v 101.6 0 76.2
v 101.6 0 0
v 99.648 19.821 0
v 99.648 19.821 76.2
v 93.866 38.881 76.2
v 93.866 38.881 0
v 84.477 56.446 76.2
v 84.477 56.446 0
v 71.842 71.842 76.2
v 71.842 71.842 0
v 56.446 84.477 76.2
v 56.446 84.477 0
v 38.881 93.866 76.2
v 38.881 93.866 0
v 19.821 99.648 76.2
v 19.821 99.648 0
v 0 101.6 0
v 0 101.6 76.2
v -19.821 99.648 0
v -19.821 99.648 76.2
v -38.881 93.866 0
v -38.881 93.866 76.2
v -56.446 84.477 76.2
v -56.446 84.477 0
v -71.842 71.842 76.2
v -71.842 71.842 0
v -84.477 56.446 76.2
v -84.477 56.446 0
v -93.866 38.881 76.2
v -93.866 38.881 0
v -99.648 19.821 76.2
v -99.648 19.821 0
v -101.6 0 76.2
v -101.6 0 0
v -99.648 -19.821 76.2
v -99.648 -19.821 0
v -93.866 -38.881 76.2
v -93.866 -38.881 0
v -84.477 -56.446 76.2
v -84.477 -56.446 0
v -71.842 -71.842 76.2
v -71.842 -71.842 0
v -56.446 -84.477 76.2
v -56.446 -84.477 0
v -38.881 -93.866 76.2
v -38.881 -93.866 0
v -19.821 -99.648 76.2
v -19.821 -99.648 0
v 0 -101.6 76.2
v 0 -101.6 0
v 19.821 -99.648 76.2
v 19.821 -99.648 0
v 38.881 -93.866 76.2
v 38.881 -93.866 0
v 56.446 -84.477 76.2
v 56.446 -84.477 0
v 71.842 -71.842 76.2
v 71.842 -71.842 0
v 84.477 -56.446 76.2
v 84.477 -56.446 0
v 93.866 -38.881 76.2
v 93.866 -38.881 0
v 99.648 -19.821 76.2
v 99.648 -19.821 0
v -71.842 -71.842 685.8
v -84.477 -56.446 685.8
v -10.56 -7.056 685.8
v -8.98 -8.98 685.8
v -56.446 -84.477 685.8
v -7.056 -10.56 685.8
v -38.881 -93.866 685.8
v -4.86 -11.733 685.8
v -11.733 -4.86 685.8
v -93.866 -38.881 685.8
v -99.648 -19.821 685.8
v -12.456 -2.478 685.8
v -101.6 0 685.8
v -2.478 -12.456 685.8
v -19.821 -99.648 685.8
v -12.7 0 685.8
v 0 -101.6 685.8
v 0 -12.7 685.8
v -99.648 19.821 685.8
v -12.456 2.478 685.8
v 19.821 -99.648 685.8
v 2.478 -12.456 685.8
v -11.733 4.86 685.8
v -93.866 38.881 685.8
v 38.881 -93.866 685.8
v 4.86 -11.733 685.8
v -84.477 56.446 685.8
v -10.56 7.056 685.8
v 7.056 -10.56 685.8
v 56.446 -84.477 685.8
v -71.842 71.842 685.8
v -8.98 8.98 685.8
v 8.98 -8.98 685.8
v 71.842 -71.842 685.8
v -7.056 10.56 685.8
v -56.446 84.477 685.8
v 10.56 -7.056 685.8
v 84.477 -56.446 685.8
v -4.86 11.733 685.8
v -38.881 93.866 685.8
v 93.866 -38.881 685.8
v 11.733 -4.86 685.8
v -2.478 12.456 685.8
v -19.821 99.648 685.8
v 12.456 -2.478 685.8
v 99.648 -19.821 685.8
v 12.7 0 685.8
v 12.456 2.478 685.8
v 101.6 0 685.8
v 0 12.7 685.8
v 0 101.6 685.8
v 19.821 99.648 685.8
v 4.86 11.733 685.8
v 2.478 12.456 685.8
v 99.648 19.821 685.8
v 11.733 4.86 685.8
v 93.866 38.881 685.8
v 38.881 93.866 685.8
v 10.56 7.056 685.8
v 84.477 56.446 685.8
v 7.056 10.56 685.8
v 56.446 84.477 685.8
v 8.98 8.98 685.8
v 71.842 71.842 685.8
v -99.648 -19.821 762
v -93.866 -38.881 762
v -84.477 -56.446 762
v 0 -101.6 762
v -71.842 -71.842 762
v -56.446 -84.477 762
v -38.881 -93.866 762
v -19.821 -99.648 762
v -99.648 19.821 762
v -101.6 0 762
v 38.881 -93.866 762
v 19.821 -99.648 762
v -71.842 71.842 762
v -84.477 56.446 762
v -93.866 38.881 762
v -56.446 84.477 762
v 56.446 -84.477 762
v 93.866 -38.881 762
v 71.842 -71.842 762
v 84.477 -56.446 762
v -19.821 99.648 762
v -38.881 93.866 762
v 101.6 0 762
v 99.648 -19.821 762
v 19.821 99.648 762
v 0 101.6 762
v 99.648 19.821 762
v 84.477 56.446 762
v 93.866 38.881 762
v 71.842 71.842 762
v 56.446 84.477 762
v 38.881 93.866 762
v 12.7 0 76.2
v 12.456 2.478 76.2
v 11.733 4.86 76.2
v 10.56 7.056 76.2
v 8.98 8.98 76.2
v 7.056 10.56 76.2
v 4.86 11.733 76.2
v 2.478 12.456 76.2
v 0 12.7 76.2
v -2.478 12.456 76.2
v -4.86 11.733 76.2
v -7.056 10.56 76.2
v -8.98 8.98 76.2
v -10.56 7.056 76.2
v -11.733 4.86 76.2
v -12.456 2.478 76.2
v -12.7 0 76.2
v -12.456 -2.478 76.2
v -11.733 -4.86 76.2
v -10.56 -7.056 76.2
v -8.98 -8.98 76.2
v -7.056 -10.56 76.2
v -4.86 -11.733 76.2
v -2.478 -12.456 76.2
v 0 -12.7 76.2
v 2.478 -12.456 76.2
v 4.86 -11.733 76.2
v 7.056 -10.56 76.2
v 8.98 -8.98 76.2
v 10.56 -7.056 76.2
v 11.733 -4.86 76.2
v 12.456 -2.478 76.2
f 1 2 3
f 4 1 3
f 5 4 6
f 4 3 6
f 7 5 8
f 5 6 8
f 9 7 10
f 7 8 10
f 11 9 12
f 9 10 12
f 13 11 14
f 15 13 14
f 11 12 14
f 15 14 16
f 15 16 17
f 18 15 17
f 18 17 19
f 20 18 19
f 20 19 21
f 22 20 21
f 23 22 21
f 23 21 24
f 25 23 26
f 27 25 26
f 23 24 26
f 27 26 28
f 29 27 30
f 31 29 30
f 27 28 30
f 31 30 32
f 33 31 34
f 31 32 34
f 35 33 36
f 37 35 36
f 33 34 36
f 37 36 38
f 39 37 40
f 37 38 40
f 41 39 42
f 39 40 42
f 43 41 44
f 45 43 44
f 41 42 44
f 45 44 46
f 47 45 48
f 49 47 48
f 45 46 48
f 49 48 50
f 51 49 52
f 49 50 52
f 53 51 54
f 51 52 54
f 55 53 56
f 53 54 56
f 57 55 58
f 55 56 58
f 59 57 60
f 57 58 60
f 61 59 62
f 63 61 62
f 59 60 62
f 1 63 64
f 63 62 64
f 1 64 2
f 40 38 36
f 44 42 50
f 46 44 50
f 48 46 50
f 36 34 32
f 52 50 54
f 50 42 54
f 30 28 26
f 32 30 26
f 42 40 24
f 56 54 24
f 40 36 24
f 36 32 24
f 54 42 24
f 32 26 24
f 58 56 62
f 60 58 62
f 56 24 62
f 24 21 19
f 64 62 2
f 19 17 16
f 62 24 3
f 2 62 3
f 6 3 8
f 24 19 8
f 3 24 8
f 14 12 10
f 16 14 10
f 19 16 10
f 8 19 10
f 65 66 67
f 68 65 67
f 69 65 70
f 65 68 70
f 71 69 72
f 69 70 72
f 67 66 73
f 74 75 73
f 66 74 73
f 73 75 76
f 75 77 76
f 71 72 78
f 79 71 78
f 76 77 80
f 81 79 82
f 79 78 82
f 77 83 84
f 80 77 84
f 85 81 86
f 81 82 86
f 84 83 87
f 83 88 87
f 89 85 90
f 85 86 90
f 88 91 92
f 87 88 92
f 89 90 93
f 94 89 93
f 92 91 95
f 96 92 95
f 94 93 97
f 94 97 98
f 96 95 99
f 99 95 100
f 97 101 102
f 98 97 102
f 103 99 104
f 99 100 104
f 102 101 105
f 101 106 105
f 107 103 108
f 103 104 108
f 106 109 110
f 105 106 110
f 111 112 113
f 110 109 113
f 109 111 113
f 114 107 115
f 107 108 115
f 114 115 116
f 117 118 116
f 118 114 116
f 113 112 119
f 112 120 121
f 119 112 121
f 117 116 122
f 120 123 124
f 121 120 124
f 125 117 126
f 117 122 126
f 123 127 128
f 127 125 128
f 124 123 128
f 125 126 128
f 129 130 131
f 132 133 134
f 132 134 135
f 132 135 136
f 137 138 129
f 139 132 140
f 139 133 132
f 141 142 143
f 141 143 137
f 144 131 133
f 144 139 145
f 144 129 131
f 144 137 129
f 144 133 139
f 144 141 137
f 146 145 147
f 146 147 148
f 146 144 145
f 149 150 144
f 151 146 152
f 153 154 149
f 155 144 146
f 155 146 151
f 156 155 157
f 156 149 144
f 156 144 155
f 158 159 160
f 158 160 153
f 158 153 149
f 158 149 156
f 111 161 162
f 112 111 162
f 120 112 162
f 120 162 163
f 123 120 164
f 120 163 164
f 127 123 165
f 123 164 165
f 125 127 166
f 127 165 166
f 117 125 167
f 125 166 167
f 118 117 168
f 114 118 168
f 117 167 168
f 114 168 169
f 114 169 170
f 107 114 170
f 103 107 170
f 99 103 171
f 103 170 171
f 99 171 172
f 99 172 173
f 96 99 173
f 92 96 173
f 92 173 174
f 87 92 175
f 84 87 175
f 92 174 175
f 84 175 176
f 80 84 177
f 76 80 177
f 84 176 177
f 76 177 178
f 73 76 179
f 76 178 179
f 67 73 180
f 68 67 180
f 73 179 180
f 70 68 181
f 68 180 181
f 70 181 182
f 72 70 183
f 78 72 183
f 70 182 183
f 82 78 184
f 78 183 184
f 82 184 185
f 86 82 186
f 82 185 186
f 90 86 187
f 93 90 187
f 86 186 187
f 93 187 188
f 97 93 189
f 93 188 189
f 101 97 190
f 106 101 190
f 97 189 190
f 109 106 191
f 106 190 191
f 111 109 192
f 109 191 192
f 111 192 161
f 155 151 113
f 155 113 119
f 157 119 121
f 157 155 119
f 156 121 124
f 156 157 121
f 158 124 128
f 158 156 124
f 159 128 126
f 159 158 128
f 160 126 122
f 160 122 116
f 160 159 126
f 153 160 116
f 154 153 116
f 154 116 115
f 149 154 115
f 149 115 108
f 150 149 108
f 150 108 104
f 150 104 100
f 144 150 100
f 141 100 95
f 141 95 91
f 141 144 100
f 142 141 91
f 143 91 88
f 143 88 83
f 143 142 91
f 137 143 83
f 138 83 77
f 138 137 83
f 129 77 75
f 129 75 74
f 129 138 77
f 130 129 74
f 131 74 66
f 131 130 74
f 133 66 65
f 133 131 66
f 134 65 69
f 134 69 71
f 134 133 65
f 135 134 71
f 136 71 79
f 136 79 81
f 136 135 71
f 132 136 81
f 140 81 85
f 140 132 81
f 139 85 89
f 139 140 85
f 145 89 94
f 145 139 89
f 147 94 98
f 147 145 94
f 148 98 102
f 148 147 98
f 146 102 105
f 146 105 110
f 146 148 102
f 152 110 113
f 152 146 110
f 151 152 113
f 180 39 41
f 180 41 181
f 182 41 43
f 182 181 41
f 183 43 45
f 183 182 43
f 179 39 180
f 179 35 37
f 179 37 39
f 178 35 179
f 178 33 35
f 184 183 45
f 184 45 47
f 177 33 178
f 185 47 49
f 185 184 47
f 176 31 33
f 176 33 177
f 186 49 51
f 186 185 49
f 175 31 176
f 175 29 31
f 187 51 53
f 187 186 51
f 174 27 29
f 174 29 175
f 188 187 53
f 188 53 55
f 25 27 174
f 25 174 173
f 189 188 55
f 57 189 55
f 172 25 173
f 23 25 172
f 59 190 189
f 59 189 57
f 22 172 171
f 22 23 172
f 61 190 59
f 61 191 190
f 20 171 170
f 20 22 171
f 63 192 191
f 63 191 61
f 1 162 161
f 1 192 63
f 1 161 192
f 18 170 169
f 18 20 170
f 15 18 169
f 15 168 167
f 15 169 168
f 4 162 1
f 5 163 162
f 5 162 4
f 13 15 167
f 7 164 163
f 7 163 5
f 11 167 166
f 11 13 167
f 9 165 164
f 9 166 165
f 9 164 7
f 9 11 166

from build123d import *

# Parameters (mm, degrees)
SKETCH1_R           = 101.6
BOSS_EXTRUDE1_DEPTH = 76.2
SKETCH2_R           = 12.7
BOSS_EXTRUDE2_DEPTH = 609.6


with BuildPart() as part:
    # Sketch1 → Boss-Extrude1 (new body)
    with BuildSketch(Plane.XY):
        Circle(SKETCH1_R)
    boss_extrude1 = extrude(amount=BOSS_EXTRUDE1_DEPTH)

    # Sketch2 → Boss-Extrude2 (add)
    with BuildSketch(Plane.XY.offset(76.2)):
        Circle(SKETCH2_R)
    extrude(amount=BOSS_EXTRUDE2_DEPTH)

    # Mirror1: Boss-Extrude1 across plane
    add(boss_extrude1.mirror(Plane.XY.offset(381)))


solid = part.part
